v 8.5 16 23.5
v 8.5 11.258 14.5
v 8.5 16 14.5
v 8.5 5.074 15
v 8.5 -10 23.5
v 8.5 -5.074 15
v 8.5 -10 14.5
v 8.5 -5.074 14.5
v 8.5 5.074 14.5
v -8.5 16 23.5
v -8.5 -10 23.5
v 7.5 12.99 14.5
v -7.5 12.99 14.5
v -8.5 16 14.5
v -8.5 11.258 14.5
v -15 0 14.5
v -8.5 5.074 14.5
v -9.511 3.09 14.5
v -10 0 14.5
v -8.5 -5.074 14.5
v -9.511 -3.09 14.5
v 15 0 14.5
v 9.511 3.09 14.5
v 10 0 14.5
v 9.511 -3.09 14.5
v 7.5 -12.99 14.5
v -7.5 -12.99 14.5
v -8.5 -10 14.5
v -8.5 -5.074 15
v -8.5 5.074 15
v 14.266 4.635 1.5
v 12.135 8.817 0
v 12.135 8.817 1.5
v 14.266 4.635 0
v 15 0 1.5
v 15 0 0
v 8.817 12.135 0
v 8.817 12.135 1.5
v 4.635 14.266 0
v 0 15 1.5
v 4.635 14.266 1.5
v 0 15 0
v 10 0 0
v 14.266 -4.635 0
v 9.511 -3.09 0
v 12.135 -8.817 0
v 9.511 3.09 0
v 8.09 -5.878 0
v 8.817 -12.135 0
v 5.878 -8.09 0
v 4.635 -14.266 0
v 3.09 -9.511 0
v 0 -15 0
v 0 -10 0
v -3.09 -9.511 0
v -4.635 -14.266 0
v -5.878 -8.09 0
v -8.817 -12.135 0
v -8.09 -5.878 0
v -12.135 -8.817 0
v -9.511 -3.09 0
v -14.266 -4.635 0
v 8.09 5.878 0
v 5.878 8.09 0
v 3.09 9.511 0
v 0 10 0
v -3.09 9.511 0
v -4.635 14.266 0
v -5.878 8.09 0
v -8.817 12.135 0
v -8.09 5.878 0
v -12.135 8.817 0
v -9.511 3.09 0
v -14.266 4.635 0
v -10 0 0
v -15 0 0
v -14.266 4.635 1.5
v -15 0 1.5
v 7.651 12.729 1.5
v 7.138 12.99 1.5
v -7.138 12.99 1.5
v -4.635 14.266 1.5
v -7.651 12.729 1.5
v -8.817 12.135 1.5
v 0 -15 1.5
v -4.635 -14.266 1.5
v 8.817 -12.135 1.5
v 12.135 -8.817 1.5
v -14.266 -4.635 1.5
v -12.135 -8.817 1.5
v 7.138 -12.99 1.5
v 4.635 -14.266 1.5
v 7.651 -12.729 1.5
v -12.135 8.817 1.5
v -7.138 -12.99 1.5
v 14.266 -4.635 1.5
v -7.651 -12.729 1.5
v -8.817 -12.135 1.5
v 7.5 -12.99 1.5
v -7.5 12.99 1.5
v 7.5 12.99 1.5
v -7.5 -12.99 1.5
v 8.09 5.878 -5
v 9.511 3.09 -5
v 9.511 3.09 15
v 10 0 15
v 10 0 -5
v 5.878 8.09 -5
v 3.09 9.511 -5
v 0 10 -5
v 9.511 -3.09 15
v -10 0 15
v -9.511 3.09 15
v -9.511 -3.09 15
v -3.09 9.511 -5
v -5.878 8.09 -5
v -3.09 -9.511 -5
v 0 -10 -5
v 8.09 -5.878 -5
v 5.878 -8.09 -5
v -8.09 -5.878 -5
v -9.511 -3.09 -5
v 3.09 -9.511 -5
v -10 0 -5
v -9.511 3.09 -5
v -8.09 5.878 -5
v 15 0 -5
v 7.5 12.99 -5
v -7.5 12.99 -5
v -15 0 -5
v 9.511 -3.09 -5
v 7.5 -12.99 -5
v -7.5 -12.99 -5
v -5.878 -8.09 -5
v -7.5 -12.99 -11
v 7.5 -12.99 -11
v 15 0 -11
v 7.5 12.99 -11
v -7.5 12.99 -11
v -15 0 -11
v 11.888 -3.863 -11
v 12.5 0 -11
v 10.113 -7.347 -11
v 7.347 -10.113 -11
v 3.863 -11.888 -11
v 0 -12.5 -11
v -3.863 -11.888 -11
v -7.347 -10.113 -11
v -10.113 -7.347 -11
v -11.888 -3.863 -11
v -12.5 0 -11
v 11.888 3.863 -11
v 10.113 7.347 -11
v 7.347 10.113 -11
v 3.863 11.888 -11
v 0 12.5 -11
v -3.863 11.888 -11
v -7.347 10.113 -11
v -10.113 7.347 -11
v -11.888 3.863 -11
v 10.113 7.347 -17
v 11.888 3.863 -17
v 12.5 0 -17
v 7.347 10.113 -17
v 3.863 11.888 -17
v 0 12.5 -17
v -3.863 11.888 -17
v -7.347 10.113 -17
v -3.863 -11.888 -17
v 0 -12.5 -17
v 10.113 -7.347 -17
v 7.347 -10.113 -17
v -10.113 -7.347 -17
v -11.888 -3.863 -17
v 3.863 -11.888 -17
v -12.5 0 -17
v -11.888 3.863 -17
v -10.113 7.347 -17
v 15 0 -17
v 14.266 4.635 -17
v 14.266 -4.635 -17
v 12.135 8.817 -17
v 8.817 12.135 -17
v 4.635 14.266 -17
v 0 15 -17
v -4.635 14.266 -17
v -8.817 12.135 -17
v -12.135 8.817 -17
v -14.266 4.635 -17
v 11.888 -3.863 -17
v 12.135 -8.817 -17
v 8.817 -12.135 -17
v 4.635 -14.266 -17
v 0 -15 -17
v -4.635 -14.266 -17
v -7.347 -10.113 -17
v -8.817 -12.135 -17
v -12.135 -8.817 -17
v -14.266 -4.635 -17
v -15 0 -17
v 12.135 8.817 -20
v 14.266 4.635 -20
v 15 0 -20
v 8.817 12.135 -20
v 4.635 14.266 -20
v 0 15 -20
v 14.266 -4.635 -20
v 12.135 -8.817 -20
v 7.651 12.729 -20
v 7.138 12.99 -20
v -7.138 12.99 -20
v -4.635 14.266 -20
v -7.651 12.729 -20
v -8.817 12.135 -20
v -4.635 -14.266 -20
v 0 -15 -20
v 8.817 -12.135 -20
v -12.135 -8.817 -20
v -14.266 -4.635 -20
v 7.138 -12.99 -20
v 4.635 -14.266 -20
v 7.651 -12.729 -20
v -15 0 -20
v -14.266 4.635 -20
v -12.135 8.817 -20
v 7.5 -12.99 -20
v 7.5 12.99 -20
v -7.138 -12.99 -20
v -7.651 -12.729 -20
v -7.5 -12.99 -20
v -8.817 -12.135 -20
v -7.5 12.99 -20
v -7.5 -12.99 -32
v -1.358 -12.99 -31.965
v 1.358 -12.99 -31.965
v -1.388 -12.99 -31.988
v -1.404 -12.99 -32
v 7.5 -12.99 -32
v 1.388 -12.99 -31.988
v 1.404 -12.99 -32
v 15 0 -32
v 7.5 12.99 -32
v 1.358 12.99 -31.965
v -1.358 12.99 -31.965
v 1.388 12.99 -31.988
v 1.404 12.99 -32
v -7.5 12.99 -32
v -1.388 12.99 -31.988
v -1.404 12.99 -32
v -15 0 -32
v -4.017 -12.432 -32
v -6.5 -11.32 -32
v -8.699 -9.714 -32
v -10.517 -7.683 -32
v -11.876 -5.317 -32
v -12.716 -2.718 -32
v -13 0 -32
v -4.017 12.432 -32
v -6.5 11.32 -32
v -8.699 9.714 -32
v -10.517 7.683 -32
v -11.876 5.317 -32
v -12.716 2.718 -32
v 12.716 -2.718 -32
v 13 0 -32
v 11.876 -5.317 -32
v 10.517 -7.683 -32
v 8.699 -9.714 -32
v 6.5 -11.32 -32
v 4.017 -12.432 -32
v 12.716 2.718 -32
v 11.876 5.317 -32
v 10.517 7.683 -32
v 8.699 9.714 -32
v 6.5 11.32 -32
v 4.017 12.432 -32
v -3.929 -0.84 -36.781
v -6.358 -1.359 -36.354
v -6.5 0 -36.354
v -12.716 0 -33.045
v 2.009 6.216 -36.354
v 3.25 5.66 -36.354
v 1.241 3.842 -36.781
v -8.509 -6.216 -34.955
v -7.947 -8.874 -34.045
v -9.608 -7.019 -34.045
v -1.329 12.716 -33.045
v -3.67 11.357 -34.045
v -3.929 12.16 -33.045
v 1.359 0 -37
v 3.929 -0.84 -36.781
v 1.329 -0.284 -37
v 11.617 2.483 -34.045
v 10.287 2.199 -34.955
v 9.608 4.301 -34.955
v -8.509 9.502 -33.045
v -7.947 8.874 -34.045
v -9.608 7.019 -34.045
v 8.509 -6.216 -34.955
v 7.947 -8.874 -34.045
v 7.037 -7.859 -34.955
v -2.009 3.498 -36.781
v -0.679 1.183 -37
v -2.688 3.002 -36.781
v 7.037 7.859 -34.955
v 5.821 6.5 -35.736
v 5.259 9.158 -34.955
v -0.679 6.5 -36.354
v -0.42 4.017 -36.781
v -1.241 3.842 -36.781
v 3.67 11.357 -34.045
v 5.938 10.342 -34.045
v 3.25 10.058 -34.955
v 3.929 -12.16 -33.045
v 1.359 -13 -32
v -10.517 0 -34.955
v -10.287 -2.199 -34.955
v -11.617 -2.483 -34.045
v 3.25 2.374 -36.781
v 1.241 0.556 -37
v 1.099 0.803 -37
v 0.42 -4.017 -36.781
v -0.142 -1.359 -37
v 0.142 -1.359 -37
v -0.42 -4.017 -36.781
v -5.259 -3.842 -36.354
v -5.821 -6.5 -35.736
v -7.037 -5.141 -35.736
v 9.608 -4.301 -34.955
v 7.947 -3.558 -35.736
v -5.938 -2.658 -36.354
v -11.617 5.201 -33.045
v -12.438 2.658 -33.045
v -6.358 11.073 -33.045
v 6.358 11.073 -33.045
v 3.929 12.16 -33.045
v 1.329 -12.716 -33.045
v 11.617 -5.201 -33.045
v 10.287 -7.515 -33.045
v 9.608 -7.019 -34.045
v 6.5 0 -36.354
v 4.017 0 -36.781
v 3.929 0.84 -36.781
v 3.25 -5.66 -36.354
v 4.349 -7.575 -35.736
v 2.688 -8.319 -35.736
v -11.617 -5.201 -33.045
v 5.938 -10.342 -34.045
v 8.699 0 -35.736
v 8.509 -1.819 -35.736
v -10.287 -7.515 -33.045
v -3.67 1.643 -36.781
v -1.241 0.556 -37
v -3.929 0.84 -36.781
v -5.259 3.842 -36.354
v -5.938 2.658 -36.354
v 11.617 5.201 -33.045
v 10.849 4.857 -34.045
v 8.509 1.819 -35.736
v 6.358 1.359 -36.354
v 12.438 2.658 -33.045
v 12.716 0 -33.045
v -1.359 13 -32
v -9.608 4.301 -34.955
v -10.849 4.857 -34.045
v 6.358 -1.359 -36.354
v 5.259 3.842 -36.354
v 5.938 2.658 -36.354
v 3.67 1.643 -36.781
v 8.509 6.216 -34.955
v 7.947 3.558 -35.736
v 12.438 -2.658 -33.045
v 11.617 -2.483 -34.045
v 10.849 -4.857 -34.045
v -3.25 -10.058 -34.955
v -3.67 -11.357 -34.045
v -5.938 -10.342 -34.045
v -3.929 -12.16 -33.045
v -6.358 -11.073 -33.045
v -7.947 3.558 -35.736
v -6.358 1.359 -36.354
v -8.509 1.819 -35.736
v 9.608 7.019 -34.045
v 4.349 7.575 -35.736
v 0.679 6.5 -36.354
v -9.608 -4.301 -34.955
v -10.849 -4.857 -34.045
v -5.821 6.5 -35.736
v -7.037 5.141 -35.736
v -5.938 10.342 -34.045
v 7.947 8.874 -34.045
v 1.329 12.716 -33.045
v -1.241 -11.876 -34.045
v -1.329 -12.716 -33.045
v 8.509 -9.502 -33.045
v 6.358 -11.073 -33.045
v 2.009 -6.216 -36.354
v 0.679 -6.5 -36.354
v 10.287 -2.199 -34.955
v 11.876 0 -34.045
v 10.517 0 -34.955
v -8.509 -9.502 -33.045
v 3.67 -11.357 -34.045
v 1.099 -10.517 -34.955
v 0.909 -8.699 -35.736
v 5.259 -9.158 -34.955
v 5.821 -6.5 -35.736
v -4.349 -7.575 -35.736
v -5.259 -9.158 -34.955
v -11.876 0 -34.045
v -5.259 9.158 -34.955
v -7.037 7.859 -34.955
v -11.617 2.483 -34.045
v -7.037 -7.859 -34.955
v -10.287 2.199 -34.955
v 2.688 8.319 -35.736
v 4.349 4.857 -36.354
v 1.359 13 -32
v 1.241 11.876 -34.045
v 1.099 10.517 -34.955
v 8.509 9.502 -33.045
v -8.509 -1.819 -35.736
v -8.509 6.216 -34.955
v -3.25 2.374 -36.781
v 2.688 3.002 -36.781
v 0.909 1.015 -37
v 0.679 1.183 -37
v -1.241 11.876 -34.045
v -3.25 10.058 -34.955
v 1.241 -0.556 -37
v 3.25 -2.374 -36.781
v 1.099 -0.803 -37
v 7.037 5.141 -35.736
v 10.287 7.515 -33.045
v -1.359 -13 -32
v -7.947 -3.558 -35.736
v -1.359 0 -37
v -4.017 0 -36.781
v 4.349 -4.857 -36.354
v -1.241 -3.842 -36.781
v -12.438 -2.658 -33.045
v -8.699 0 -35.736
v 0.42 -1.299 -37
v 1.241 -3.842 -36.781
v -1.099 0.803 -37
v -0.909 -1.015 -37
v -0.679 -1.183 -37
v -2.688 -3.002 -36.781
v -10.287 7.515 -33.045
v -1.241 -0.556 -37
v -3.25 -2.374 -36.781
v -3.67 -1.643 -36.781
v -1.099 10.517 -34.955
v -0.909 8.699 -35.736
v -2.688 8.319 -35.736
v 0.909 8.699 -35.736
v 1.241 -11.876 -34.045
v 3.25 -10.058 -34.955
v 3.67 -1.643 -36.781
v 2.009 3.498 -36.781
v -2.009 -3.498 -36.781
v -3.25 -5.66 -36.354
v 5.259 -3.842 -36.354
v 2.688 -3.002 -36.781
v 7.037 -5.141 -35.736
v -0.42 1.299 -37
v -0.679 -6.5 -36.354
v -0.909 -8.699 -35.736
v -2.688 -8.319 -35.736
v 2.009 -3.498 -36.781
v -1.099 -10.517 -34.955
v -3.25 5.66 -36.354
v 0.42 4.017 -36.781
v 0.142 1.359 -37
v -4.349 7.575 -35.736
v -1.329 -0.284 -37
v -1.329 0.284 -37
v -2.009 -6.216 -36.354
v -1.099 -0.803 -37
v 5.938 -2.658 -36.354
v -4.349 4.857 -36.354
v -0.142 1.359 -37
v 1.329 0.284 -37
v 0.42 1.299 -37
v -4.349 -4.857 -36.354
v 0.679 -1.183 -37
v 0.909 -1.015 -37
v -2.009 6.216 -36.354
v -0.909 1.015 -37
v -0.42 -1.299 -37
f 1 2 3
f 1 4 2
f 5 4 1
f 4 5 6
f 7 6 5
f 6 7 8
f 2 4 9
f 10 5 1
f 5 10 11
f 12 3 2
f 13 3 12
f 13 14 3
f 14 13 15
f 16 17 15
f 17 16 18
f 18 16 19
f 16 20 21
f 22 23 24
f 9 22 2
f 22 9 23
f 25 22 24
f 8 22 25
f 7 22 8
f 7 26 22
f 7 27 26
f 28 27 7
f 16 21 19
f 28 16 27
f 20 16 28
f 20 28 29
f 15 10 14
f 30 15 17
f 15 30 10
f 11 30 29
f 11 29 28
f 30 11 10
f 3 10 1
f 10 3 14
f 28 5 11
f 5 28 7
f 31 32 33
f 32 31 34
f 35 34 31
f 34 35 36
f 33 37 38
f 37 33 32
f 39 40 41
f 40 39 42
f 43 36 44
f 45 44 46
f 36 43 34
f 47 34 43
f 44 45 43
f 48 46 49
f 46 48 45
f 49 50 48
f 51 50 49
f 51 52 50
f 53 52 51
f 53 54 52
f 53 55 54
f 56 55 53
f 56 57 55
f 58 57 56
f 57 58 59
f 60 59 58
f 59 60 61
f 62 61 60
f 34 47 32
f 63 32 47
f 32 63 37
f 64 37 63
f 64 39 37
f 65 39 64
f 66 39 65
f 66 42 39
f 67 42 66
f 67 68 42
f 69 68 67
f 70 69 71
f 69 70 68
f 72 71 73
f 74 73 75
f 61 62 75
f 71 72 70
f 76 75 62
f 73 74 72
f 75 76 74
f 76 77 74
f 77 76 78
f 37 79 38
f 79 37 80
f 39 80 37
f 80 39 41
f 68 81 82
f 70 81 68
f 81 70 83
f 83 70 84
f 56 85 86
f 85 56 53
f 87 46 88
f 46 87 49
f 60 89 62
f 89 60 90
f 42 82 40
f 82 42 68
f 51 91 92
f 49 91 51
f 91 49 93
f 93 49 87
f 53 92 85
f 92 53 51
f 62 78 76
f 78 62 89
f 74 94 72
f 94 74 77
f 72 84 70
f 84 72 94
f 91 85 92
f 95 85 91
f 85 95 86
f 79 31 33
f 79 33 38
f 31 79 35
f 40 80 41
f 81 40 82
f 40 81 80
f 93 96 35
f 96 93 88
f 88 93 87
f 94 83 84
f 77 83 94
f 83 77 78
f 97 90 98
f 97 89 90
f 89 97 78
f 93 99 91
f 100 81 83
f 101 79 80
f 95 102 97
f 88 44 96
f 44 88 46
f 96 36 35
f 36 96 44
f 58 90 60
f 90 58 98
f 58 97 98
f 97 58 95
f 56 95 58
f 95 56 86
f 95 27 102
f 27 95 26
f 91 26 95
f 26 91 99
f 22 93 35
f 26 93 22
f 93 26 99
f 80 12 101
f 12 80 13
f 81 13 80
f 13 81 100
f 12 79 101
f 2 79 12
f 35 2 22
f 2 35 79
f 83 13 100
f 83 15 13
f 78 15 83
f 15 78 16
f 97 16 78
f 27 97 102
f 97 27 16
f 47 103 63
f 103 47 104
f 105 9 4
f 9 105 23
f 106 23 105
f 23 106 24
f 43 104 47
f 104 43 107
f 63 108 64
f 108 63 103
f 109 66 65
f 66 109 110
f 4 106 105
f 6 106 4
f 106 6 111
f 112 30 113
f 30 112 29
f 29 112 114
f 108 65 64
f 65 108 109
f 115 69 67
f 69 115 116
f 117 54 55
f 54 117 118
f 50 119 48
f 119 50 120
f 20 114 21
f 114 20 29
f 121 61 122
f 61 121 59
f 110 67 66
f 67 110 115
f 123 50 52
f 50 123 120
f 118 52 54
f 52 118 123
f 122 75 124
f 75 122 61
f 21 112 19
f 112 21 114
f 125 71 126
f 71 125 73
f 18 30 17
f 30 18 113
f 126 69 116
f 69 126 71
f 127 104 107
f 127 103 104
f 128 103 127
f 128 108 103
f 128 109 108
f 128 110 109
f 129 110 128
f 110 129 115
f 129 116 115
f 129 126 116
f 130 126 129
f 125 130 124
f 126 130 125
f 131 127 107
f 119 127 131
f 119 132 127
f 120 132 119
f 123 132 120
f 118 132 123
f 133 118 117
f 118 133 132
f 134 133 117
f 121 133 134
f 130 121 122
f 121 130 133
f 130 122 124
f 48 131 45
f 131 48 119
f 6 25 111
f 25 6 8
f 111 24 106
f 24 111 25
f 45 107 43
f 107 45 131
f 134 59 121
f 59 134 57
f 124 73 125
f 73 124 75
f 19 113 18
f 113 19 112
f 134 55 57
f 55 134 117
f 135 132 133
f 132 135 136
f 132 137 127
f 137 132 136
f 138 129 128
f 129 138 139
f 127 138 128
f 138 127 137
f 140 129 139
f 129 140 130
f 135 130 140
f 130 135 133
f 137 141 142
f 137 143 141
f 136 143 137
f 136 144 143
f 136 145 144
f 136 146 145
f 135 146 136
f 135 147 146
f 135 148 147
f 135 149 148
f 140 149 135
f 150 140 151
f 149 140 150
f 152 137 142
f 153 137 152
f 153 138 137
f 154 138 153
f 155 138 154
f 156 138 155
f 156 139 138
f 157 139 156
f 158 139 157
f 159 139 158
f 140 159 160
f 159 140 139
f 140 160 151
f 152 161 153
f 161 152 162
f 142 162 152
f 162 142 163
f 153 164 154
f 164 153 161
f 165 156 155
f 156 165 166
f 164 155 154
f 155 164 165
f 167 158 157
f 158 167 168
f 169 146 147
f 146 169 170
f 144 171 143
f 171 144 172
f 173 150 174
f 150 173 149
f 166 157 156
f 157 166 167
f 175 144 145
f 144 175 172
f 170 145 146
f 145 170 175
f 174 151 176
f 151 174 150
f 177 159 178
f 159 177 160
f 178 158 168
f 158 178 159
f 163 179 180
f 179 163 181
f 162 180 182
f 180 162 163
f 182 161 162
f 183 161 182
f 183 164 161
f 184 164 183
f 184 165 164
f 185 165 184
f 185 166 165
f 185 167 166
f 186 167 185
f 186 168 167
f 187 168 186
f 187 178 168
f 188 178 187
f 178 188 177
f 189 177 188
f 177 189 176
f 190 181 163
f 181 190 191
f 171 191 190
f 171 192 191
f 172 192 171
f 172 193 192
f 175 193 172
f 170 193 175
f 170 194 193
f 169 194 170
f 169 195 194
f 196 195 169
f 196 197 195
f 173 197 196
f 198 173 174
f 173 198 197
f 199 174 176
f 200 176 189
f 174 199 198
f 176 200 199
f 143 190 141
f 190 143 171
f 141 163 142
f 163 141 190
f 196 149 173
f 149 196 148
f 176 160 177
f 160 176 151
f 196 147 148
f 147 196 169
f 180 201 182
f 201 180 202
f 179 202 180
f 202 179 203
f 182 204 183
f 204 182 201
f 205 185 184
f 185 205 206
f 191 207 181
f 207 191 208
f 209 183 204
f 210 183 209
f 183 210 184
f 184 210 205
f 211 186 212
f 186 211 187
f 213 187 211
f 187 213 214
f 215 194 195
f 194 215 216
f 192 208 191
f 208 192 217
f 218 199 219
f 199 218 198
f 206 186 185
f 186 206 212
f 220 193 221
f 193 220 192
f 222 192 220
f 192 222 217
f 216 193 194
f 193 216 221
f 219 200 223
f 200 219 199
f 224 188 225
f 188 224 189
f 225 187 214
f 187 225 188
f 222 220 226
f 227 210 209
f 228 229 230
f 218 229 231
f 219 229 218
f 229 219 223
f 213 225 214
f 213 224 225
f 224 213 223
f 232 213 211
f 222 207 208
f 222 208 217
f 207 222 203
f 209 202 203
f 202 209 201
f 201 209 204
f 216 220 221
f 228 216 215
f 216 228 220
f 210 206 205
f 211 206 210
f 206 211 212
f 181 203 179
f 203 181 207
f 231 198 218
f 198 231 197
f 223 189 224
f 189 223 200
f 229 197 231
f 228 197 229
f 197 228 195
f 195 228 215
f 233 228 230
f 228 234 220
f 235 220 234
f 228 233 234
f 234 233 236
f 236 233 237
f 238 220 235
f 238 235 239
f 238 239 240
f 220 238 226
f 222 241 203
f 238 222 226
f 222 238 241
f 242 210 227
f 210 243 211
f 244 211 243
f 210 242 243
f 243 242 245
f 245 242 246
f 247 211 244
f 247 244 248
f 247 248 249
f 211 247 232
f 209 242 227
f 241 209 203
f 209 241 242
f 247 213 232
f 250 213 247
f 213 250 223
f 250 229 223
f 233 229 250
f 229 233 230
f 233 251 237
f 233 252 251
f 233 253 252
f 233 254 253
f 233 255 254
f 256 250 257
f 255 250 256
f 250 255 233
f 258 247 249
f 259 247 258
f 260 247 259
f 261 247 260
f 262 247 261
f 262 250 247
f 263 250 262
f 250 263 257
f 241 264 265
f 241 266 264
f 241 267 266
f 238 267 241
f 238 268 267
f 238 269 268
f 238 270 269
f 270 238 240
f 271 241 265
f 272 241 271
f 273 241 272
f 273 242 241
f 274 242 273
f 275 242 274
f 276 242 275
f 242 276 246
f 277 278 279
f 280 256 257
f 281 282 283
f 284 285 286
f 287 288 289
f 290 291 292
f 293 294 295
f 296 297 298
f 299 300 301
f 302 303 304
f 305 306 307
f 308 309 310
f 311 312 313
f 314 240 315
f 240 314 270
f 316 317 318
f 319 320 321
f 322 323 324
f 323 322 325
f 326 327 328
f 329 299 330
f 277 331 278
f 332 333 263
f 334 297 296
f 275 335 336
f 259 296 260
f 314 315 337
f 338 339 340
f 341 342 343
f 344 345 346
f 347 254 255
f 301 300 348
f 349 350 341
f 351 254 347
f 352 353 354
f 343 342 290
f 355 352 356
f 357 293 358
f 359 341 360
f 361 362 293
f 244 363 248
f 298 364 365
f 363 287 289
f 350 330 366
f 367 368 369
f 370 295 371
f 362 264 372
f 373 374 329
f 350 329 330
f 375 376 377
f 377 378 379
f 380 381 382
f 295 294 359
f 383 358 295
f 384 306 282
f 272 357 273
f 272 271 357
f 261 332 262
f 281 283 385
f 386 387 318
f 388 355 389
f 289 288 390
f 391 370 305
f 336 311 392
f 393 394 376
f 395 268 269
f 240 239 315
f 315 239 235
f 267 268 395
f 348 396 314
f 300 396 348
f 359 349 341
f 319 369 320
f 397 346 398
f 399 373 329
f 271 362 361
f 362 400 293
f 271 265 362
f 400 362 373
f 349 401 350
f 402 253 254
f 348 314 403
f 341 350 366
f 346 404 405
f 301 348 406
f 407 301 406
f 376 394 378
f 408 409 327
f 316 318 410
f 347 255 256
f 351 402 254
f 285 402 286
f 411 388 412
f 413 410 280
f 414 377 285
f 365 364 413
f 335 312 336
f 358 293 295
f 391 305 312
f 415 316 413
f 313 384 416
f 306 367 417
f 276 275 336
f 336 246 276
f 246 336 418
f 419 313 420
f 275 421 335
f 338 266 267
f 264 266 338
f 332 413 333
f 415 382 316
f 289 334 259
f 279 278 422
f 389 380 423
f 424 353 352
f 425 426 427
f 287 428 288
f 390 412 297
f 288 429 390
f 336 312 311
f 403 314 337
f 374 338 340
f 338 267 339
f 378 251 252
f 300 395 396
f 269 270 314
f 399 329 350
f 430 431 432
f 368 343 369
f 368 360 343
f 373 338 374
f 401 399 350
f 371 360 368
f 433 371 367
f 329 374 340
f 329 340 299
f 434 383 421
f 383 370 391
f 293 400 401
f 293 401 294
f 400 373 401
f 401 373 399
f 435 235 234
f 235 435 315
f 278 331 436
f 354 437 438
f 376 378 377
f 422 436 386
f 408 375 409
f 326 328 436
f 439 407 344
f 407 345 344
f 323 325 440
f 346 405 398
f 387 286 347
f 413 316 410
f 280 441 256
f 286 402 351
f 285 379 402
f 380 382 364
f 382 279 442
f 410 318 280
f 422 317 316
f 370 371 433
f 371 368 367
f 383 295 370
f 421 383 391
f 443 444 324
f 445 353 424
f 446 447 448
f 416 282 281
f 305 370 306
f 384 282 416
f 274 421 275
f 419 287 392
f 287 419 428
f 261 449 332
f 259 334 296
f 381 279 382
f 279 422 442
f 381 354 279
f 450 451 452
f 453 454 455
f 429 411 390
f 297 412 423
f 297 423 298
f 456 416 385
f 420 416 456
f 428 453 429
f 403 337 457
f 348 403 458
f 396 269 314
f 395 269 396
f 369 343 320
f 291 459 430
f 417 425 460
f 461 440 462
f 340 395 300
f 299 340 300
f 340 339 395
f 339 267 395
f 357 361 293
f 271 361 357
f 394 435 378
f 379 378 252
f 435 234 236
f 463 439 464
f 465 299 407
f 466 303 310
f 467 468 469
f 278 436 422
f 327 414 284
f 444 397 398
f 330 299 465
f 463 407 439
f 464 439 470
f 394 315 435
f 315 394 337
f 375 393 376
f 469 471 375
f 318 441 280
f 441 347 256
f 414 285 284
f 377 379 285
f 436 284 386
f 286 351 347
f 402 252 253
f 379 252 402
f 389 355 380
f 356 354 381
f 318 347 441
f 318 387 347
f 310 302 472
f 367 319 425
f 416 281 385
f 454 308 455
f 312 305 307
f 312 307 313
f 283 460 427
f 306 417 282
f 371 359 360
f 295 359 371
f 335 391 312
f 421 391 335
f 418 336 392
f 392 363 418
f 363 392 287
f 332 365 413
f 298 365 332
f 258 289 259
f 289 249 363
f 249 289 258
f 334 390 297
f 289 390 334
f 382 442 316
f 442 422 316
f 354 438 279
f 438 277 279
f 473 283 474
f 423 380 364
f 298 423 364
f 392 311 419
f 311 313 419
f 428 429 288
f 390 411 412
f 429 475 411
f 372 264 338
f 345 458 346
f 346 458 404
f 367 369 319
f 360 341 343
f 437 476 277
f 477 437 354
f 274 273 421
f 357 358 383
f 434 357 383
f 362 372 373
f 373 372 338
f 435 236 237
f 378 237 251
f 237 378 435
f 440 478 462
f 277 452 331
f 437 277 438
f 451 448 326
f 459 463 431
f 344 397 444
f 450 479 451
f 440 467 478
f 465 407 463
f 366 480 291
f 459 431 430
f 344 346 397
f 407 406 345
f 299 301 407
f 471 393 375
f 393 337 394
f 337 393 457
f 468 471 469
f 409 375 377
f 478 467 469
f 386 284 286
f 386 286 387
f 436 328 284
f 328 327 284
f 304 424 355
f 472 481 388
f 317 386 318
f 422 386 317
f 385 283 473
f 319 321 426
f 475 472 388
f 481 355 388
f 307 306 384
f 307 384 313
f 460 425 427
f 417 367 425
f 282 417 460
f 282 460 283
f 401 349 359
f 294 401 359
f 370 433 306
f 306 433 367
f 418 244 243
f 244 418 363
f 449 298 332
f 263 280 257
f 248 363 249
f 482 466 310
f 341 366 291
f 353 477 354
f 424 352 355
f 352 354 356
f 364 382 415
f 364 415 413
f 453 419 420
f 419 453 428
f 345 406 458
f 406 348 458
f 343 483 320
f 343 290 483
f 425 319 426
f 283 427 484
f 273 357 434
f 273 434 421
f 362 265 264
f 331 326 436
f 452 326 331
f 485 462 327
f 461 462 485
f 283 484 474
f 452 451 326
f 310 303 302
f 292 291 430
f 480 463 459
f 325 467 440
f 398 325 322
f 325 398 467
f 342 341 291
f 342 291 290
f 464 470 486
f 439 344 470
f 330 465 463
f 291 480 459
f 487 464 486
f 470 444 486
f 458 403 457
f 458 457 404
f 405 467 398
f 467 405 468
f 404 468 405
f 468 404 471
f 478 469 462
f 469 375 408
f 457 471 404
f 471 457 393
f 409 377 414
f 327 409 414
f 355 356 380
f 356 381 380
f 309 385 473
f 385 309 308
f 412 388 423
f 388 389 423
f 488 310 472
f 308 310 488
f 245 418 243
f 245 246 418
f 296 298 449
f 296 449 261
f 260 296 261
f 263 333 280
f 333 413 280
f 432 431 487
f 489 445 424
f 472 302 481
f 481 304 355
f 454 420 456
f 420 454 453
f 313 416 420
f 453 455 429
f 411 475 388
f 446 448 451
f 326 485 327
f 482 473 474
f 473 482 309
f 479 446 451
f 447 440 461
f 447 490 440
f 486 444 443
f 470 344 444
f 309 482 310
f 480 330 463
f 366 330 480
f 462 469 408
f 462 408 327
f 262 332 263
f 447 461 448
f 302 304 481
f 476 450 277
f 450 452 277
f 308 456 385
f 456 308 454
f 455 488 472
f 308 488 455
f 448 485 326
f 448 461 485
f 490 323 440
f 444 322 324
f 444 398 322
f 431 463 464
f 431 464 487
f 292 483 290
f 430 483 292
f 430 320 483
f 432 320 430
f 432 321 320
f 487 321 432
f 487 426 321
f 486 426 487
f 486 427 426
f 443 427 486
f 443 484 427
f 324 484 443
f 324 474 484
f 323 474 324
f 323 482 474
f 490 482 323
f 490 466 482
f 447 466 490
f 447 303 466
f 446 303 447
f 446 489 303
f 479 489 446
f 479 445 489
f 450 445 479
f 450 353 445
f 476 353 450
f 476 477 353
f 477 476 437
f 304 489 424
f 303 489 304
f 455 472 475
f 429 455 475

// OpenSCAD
// file: params.scad
DOME_DIA = 150;
DOME_THICK = 2.5;
ORING_DIA = 5.4;

function r_from_dia(d) = d / 2;
// main file
include<params.scad>

module LAN_connector()
{
    color([0.2,0.2,0.2,1])
    union()
    {
        translate([0,3,19])
            cube([17,26,9], center=true);
        translate([0,0,0])
            cylinder(r=r_from_dia(30), h=1.5, $fn = 20);
        translate([0,0,1.5])
            cylinder(r=r_from_dia(30), h=13, $fn = 6);
        translate([0,0,2.5])
            cylinder(r=r_from_dia(7), h=5, center=true, $fn = 20);
    }
    color([0.2,0.2,0.2,1]) translate([0,0,-5]) mirror([0,0,1])
    union()
    {
        translate([0,0,-20])
            cylinder(r=r_from_dia(20), h=20, $fn = 20);
        translate([0,0,0])
            cylinder(r=r_from_dia(30), h=6, $fn = 6);
        translate([0,0,2.5])
            cylinder(r=r_from_dia(7), h=5, center=true, $fn = 20);
        translate([0,0,6])
            cylinder(r=r_from_dia(25), h=6, $fn = 20);
        translate([0,0,12])
            cylinder(r=r_from_dia(30), h=3, $fn = 20);
        translate([0,0,15])
            cylinder(r=r_from_dia(30), h=12, $fn = 6);
        translate([0,0,27])
        	resize(newsize=[26,26,10]) sphere(r=r_from_dia(26));
    }
}

LAN_connector();
